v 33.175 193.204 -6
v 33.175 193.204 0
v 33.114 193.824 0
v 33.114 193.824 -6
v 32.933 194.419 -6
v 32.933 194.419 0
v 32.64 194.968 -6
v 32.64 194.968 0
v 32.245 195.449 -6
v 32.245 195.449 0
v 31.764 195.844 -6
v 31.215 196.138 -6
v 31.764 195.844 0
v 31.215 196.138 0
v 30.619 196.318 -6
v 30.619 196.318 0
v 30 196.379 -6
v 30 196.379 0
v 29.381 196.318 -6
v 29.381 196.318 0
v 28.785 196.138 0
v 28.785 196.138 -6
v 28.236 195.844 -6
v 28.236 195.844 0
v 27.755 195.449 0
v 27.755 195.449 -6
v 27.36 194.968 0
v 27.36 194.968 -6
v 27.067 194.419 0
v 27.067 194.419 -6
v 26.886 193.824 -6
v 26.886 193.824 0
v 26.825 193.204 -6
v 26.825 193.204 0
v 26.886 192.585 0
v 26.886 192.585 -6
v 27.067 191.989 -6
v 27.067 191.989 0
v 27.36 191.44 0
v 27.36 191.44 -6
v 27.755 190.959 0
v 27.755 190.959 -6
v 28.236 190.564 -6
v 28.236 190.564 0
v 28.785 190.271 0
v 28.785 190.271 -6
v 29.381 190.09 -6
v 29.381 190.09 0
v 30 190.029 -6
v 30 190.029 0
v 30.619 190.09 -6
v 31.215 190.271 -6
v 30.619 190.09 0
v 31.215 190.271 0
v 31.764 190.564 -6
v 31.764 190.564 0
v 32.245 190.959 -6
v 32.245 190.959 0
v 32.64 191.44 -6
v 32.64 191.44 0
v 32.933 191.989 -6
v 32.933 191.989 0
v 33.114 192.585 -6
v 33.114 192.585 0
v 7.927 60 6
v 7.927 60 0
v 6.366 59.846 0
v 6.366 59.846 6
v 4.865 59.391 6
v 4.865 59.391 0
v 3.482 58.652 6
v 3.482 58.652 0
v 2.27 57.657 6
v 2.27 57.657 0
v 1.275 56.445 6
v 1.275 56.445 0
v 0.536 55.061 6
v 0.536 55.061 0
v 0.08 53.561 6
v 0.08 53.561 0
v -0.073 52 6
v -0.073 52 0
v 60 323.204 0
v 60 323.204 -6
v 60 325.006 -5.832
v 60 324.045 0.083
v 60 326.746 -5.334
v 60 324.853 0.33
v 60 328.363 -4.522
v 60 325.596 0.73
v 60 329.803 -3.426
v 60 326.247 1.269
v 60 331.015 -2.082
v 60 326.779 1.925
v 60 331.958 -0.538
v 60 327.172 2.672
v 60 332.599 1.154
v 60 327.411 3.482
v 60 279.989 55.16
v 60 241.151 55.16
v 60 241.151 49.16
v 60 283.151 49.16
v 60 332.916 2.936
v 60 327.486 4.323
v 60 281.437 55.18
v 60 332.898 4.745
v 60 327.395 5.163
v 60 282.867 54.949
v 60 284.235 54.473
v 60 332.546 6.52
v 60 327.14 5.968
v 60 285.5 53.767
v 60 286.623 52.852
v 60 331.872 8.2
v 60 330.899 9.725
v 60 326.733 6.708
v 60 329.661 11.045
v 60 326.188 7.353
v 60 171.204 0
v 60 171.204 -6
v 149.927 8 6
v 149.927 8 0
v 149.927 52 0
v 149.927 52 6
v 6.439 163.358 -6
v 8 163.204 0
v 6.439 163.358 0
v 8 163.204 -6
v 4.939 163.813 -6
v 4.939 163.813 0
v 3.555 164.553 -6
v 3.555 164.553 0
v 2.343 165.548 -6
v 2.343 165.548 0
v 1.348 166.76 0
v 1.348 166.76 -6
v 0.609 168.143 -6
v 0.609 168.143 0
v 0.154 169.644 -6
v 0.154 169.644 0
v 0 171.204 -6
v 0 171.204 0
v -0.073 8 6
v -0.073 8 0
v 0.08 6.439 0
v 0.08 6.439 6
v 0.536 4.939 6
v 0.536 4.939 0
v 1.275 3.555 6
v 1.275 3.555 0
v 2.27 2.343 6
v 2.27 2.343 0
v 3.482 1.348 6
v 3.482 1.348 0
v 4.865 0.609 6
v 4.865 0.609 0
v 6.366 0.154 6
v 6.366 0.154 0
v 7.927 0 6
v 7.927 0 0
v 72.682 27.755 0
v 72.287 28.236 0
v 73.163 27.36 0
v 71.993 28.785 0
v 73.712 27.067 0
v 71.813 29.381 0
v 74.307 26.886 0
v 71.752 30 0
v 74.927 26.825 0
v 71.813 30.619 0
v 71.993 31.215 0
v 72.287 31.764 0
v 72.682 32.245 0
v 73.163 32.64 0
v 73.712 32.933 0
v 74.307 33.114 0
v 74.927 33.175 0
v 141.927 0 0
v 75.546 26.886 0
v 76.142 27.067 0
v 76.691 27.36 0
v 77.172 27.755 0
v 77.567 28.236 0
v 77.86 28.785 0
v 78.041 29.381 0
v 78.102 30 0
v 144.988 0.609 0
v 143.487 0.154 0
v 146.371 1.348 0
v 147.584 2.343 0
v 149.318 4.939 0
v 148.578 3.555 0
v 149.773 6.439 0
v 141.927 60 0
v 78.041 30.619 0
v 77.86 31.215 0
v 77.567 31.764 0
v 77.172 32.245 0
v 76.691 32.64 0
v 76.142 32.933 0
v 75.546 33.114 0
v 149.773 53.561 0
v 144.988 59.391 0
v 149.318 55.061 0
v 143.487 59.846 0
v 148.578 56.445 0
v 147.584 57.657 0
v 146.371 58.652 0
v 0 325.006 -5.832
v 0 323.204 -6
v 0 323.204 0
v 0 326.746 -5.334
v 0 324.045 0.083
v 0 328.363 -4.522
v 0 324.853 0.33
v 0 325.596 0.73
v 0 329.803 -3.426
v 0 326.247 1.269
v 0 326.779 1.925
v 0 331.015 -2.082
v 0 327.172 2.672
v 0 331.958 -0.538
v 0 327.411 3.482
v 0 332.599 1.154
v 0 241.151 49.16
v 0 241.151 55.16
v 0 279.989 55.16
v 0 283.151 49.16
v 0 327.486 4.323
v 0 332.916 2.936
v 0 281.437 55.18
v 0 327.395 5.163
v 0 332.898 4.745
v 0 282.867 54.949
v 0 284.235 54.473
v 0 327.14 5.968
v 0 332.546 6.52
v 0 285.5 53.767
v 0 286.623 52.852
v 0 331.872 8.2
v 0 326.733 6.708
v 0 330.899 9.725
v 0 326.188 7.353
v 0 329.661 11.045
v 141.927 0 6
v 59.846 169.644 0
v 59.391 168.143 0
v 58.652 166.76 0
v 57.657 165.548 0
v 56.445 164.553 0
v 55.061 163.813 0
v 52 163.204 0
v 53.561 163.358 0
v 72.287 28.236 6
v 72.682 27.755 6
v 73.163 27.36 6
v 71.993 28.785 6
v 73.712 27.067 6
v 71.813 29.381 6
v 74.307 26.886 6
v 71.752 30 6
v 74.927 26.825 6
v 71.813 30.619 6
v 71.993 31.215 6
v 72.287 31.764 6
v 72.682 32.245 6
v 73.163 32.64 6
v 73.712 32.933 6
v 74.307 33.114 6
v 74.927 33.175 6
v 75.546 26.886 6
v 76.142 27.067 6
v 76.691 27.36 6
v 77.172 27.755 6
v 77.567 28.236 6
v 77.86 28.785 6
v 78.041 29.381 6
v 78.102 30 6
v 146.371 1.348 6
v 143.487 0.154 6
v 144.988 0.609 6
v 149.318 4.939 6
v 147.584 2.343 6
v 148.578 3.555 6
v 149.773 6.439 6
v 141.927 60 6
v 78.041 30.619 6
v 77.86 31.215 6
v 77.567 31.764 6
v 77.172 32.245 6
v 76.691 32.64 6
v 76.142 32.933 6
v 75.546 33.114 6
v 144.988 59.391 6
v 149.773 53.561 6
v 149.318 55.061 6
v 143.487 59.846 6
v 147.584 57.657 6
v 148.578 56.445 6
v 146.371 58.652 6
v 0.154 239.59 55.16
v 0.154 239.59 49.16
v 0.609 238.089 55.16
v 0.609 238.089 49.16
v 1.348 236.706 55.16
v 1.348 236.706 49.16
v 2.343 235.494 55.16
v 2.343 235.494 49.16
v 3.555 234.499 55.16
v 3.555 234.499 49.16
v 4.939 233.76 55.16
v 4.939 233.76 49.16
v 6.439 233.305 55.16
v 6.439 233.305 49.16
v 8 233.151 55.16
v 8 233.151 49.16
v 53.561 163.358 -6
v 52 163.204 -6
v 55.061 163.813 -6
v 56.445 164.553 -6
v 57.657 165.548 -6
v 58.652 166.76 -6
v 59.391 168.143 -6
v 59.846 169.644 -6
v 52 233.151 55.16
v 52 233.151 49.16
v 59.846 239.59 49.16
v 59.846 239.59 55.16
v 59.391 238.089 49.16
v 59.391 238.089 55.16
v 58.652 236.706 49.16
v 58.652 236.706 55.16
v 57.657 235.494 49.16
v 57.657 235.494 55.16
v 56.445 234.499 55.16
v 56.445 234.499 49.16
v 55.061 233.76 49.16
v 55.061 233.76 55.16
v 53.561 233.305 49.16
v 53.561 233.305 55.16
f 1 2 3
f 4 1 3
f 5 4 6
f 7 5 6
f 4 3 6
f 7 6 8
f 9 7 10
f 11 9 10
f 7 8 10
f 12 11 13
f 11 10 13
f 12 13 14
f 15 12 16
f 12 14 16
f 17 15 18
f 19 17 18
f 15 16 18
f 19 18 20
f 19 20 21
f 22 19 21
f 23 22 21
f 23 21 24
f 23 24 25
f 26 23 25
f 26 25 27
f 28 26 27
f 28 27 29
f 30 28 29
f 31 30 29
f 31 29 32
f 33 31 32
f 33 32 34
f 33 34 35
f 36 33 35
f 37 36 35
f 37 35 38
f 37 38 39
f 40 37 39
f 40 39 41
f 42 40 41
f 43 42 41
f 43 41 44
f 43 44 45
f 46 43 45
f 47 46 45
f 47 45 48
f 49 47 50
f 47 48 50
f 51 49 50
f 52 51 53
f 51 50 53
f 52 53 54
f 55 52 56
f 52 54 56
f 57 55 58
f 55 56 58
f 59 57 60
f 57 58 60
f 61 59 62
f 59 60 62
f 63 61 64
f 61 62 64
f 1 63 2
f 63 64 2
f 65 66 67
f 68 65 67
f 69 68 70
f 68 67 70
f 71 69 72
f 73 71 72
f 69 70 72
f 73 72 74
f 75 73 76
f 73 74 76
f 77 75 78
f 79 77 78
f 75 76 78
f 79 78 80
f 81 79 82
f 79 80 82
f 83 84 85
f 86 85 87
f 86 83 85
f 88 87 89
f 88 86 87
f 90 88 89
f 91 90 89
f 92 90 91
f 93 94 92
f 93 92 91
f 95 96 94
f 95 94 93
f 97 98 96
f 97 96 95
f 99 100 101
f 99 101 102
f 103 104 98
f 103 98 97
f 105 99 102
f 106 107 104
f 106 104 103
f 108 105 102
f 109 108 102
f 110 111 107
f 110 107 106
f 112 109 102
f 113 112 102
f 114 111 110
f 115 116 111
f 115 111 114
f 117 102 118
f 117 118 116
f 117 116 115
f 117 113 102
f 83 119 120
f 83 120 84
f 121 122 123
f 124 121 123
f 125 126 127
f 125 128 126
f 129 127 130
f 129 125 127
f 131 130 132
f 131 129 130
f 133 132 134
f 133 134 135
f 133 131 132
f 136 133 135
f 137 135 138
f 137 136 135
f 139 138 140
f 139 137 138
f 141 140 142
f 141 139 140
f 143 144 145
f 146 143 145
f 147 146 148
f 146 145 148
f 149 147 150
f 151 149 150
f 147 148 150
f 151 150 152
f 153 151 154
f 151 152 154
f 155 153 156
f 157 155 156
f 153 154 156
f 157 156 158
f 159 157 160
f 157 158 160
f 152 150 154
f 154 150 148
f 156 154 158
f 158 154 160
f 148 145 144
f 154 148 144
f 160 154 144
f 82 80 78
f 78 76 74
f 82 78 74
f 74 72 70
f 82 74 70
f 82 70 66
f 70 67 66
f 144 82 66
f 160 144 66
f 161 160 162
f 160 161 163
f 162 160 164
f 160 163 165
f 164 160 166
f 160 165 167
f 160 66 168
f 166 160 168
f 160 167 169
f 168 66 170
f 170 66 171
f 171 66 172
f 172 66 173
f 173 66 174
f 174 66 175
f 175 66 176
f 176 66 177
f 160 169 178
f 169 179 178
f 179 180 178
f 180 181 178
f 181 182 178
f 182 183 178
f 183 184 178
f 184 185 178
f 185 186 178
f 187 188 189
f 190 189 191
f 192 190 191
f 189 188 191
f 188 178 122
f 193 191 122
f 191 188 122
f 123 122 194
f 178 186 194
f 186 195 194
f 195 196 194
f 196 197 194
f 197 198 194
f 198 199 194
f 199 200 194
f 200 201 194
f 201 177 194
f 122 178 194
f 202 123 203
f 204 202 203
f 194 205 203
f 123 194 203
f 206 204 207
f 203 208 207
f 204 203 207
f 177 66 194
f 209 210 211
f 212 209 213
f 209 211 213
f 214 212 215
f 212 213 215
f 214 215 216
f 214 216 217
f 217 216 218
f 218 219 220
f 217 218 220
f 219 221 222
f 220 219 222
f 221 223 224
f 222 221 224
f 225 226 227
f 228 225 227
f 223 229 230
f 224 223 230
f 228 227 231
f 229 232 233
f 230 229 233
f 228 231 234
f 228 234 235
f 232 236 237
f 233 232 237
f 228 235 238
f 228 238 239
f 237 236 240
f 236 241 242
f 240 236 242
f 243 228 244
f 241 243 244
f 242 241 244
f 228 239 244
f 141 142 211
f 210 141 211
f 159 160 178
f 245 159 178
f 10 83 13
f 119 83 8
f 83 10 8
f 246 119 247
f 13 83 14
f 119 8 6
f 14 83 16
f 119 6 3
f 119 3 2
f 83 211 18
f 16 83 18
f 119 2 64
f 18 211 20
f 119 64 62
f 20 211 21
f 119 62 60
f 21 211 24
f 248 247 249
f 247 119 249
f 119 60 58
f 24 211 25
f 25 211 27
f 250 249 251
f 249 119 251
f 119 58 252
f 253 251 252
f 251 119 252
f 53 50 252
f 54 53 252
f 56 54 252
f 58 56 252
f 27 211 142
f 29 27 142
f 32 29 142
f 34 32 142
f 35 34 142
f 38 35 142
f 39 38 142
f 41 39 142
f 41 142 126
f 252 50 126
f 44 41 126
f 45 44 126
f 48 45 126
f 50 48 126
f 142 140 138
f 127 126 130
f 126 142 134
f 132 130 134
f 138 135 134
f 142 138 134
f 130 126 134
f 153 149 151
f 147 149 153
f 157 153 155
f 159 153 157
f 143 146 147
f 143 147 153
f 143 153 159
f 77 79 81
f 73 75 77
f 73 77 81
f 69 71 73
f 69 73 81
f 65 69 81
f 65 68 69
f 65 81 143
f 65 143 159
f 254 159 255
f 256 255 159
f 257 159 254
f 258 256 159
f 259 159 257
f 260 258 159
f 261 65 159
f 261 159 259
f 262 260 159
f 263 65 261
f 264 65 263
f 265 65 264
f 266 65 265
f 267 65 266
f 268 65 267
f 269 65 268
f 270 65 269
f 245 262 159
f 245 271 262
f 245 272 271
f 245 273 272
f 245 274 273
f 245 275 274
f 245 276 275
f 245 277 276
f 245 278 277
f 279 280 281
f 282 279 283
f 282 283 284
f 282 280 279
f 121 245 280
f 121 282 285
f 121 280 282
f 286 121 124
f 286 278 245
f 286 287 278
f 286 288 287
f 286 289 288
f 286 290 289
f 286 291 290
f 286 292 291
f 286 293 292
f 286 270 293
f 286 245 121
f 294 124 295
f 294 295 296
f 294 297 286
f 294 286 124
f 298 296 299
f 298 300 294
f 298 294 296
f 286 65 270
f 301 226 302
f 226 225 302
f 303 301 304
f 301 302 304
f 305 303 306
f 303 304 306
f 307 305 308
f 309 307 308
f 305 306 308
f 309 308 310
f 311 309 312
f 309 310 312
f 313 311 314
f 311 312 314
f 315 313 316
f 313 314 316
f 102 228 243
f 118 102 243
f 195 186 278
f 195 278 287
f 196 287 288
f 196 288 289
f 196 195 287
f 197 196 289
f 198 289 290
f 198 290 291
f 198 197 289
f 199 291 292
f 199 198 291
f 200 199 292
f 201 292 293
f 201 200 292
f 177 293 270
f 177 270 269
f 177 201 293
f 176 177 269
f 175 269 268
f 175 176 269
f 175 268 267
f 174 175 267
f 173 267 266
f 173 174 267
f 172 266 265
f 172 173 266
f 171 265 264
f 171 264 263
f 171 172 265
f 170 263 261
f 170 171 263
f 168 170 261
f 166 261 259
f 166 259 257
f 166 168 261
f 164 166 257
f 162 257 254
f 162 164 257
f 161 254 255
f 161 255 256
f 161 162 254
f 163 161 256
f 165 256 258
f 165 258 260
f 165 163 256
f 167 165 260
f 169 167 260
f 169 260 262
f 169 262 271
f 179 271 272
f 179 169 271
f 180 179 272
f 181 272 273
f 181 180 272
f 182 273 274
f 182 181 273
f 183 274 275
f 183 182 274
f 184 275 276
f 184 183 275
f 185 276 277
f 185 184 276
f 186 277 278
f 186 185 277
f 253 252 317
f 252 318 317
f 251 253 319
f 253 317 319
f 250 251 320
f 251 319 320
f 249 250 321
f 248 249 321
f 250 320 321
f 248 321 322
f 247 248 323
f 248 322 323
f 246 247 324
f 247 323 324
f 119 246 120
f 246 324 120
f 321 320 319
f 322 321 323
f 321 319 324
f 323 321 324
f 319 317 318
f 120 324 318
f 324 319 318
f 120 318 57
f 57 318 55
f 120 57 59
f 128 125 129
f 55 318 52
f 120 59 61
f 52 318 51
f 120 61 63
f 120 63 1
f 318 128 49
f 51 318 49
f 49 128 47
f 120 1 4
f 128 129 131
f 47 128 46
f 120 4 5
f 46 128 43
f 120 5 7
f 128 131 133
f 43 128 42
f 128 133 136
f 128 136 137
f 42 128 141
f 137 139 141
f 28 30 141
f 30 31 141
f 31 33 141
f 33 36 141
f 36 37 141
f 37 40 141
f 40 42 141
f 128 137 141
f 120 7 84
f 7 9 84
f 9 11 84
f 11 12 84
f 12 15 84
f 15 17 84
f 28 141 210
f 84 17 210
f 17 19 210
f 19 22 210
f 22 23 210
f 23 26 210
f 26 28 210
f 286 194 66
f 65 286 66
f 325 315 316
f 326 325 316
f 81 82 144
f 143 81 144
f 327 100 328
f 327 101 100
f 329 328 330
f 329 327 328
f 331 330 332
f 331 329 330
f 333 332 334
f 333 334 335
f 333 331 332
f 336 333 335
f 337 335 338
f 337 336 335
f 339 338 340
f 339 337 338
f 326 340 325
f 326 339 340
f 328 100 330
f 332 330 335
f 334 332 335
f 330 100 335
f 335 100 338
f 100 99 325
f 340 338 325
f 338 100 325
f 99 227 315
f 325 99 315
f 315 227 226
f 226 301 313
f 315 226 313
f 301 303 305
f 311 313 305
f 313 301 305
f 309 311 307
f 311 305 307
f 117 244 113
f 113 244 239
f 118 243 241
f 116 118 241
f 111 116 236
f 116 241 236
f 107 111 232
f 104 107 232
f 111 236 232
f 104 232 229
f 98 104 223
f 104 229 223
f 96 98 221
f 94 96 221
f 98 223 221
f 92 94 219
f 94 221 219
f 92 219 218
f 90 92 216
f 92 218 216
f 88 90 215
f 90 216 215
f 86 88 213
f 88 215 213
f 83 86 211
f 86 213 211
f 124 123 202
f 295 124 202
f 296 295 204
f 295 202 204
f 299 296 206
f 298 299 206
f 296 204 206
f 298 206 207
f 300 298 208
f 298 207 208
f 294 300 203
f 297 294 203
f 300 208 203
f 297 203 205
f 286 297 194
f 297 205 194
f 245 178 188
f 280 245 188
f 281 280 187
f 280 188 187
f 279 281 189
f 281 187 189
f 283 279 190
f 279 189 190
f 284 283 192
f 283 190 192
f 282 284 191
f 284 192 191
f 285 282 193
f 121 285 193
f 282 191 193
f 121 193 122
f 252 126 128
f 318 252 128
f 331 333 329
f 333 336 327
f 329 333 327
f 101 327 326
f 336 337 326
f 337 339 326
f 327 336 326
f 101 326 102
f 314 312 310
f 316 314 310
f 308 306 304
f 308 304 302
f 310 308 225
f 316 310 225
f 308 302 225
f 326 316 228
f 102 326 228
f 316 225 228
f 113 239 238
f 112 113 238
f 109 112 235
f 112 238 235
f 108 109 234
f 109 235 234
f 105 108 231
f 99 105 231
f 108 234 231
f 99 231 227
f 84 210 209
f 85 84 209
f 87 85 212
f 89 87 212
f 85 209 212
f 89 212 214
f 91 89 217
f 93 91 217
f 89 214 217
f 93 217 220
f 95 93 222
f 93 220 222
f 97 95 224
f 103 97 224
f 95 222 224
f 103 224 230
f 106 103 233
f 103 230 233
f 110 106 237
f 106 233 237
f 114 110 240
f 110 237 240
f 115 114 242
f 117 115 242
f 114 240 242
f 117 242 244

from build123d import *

# Parameters (mm, degrees)
F1_R     = 3.175
F3_DEPTH = 6
F5_DEPTH = 59.999999
F6_R     = 3.175
F8_DEPTH = 25
F10_R    = 8
F11_R    = 8


with BuildPart() as f3:
    # F1 (on face) → F3 (new body)
    with BuildSketch(Plane.XY):
        with BuildLine():
            ThreePointArc((149.926721, 52), (147.583575, 57.656854), (141.926721, 60))
            Line((141.926721, 60), (7.926721, 60))
            ThreePointArc((7.926721, 60), (2.269867, 57.656854), (-0.073279, 52))
            Line((-0.073279, 52), (-0.073279, 8))
            ThreePointArc((-0.073279, 8), (2.269867, 2.343146), (7.926721, 0))
            Line((7.926721, 0), (141.926721, 0))
            ThreePointArc((141.926721, 0), (147.583575, 2.343146), (149.926721, 8))
            Line((149.926721, 8), (149.926721, 52))
        make_face()
        with Locations((74.926721, 30)):
            Circle(F1_R, mode=Mode.SUBTRACT)
    extrude(amount=F3_DEPTH)


with BuildPart() as f5:
    # F4 (on Right) → F5 (new body)
    with BuildSketch(Plane.YZ):
        with BuildLine():
            Line((163.204402, 0), (163.204402, -6))
            Line((163.204402, -6), (323.204402, -6))
            ThreePointArc((323.204402, -6), (332.317723, 0.29328), (329.660543, 11.044902))
            Line((329.660543, 11.044902), (286.623358, 52.851608))
            ThreePointArc((286.623358, 52.851608), (283.561768, 54.740798), (279.988736, 55.160103))
            Line((279.988736, 55.160103), (277.550519, 55.160103))
            Line((277.550519, 55.160103), (233.150813, 55.160103))
            Line((233.150813, 55.160103), (233.150813, 49.160103))
            Line((233.150813, 49.160103), (283.150813, 49.160103))
            Line((283.150813, 49.160103), (326.187998, 7.353397))
            ThreePointArc((326.187998, 7.353397), (327.17222, 2.672069), (323.204402, 0))
            Line((323.204402, 0), (163.204402, 0))
        make_face()
    extrude(amount=F5_DEPTH)

    # F6 (on face) → F8 (cut)
    with BuildSketch(Plane.XY):
        with Locations((29.999999, 193.204402)):
            Circle(F6_R)
    extrude(amount=-F8_DEPTH, mode=Mode.SUBTRACT)

    # F10
    f10_edges = [f5.edges().sort_by_distance(p)[0] for p in [
        (59.999999, 163.204402, -3),
        (0, 163.204402, -3),
    ]]
    fillet(f10_edges, radius=F10_R)

    # F11
    f11_edges = [f5.edges().sort_by_distance(p)[0] for p in [
        (59.999999, 233.150813, 52.160103),
        (0, 233.150813, 52.160103),
    ]]
    fillet(f11_edges, radius=F11_R)


solid = Compound([f3.part, f5.part])
